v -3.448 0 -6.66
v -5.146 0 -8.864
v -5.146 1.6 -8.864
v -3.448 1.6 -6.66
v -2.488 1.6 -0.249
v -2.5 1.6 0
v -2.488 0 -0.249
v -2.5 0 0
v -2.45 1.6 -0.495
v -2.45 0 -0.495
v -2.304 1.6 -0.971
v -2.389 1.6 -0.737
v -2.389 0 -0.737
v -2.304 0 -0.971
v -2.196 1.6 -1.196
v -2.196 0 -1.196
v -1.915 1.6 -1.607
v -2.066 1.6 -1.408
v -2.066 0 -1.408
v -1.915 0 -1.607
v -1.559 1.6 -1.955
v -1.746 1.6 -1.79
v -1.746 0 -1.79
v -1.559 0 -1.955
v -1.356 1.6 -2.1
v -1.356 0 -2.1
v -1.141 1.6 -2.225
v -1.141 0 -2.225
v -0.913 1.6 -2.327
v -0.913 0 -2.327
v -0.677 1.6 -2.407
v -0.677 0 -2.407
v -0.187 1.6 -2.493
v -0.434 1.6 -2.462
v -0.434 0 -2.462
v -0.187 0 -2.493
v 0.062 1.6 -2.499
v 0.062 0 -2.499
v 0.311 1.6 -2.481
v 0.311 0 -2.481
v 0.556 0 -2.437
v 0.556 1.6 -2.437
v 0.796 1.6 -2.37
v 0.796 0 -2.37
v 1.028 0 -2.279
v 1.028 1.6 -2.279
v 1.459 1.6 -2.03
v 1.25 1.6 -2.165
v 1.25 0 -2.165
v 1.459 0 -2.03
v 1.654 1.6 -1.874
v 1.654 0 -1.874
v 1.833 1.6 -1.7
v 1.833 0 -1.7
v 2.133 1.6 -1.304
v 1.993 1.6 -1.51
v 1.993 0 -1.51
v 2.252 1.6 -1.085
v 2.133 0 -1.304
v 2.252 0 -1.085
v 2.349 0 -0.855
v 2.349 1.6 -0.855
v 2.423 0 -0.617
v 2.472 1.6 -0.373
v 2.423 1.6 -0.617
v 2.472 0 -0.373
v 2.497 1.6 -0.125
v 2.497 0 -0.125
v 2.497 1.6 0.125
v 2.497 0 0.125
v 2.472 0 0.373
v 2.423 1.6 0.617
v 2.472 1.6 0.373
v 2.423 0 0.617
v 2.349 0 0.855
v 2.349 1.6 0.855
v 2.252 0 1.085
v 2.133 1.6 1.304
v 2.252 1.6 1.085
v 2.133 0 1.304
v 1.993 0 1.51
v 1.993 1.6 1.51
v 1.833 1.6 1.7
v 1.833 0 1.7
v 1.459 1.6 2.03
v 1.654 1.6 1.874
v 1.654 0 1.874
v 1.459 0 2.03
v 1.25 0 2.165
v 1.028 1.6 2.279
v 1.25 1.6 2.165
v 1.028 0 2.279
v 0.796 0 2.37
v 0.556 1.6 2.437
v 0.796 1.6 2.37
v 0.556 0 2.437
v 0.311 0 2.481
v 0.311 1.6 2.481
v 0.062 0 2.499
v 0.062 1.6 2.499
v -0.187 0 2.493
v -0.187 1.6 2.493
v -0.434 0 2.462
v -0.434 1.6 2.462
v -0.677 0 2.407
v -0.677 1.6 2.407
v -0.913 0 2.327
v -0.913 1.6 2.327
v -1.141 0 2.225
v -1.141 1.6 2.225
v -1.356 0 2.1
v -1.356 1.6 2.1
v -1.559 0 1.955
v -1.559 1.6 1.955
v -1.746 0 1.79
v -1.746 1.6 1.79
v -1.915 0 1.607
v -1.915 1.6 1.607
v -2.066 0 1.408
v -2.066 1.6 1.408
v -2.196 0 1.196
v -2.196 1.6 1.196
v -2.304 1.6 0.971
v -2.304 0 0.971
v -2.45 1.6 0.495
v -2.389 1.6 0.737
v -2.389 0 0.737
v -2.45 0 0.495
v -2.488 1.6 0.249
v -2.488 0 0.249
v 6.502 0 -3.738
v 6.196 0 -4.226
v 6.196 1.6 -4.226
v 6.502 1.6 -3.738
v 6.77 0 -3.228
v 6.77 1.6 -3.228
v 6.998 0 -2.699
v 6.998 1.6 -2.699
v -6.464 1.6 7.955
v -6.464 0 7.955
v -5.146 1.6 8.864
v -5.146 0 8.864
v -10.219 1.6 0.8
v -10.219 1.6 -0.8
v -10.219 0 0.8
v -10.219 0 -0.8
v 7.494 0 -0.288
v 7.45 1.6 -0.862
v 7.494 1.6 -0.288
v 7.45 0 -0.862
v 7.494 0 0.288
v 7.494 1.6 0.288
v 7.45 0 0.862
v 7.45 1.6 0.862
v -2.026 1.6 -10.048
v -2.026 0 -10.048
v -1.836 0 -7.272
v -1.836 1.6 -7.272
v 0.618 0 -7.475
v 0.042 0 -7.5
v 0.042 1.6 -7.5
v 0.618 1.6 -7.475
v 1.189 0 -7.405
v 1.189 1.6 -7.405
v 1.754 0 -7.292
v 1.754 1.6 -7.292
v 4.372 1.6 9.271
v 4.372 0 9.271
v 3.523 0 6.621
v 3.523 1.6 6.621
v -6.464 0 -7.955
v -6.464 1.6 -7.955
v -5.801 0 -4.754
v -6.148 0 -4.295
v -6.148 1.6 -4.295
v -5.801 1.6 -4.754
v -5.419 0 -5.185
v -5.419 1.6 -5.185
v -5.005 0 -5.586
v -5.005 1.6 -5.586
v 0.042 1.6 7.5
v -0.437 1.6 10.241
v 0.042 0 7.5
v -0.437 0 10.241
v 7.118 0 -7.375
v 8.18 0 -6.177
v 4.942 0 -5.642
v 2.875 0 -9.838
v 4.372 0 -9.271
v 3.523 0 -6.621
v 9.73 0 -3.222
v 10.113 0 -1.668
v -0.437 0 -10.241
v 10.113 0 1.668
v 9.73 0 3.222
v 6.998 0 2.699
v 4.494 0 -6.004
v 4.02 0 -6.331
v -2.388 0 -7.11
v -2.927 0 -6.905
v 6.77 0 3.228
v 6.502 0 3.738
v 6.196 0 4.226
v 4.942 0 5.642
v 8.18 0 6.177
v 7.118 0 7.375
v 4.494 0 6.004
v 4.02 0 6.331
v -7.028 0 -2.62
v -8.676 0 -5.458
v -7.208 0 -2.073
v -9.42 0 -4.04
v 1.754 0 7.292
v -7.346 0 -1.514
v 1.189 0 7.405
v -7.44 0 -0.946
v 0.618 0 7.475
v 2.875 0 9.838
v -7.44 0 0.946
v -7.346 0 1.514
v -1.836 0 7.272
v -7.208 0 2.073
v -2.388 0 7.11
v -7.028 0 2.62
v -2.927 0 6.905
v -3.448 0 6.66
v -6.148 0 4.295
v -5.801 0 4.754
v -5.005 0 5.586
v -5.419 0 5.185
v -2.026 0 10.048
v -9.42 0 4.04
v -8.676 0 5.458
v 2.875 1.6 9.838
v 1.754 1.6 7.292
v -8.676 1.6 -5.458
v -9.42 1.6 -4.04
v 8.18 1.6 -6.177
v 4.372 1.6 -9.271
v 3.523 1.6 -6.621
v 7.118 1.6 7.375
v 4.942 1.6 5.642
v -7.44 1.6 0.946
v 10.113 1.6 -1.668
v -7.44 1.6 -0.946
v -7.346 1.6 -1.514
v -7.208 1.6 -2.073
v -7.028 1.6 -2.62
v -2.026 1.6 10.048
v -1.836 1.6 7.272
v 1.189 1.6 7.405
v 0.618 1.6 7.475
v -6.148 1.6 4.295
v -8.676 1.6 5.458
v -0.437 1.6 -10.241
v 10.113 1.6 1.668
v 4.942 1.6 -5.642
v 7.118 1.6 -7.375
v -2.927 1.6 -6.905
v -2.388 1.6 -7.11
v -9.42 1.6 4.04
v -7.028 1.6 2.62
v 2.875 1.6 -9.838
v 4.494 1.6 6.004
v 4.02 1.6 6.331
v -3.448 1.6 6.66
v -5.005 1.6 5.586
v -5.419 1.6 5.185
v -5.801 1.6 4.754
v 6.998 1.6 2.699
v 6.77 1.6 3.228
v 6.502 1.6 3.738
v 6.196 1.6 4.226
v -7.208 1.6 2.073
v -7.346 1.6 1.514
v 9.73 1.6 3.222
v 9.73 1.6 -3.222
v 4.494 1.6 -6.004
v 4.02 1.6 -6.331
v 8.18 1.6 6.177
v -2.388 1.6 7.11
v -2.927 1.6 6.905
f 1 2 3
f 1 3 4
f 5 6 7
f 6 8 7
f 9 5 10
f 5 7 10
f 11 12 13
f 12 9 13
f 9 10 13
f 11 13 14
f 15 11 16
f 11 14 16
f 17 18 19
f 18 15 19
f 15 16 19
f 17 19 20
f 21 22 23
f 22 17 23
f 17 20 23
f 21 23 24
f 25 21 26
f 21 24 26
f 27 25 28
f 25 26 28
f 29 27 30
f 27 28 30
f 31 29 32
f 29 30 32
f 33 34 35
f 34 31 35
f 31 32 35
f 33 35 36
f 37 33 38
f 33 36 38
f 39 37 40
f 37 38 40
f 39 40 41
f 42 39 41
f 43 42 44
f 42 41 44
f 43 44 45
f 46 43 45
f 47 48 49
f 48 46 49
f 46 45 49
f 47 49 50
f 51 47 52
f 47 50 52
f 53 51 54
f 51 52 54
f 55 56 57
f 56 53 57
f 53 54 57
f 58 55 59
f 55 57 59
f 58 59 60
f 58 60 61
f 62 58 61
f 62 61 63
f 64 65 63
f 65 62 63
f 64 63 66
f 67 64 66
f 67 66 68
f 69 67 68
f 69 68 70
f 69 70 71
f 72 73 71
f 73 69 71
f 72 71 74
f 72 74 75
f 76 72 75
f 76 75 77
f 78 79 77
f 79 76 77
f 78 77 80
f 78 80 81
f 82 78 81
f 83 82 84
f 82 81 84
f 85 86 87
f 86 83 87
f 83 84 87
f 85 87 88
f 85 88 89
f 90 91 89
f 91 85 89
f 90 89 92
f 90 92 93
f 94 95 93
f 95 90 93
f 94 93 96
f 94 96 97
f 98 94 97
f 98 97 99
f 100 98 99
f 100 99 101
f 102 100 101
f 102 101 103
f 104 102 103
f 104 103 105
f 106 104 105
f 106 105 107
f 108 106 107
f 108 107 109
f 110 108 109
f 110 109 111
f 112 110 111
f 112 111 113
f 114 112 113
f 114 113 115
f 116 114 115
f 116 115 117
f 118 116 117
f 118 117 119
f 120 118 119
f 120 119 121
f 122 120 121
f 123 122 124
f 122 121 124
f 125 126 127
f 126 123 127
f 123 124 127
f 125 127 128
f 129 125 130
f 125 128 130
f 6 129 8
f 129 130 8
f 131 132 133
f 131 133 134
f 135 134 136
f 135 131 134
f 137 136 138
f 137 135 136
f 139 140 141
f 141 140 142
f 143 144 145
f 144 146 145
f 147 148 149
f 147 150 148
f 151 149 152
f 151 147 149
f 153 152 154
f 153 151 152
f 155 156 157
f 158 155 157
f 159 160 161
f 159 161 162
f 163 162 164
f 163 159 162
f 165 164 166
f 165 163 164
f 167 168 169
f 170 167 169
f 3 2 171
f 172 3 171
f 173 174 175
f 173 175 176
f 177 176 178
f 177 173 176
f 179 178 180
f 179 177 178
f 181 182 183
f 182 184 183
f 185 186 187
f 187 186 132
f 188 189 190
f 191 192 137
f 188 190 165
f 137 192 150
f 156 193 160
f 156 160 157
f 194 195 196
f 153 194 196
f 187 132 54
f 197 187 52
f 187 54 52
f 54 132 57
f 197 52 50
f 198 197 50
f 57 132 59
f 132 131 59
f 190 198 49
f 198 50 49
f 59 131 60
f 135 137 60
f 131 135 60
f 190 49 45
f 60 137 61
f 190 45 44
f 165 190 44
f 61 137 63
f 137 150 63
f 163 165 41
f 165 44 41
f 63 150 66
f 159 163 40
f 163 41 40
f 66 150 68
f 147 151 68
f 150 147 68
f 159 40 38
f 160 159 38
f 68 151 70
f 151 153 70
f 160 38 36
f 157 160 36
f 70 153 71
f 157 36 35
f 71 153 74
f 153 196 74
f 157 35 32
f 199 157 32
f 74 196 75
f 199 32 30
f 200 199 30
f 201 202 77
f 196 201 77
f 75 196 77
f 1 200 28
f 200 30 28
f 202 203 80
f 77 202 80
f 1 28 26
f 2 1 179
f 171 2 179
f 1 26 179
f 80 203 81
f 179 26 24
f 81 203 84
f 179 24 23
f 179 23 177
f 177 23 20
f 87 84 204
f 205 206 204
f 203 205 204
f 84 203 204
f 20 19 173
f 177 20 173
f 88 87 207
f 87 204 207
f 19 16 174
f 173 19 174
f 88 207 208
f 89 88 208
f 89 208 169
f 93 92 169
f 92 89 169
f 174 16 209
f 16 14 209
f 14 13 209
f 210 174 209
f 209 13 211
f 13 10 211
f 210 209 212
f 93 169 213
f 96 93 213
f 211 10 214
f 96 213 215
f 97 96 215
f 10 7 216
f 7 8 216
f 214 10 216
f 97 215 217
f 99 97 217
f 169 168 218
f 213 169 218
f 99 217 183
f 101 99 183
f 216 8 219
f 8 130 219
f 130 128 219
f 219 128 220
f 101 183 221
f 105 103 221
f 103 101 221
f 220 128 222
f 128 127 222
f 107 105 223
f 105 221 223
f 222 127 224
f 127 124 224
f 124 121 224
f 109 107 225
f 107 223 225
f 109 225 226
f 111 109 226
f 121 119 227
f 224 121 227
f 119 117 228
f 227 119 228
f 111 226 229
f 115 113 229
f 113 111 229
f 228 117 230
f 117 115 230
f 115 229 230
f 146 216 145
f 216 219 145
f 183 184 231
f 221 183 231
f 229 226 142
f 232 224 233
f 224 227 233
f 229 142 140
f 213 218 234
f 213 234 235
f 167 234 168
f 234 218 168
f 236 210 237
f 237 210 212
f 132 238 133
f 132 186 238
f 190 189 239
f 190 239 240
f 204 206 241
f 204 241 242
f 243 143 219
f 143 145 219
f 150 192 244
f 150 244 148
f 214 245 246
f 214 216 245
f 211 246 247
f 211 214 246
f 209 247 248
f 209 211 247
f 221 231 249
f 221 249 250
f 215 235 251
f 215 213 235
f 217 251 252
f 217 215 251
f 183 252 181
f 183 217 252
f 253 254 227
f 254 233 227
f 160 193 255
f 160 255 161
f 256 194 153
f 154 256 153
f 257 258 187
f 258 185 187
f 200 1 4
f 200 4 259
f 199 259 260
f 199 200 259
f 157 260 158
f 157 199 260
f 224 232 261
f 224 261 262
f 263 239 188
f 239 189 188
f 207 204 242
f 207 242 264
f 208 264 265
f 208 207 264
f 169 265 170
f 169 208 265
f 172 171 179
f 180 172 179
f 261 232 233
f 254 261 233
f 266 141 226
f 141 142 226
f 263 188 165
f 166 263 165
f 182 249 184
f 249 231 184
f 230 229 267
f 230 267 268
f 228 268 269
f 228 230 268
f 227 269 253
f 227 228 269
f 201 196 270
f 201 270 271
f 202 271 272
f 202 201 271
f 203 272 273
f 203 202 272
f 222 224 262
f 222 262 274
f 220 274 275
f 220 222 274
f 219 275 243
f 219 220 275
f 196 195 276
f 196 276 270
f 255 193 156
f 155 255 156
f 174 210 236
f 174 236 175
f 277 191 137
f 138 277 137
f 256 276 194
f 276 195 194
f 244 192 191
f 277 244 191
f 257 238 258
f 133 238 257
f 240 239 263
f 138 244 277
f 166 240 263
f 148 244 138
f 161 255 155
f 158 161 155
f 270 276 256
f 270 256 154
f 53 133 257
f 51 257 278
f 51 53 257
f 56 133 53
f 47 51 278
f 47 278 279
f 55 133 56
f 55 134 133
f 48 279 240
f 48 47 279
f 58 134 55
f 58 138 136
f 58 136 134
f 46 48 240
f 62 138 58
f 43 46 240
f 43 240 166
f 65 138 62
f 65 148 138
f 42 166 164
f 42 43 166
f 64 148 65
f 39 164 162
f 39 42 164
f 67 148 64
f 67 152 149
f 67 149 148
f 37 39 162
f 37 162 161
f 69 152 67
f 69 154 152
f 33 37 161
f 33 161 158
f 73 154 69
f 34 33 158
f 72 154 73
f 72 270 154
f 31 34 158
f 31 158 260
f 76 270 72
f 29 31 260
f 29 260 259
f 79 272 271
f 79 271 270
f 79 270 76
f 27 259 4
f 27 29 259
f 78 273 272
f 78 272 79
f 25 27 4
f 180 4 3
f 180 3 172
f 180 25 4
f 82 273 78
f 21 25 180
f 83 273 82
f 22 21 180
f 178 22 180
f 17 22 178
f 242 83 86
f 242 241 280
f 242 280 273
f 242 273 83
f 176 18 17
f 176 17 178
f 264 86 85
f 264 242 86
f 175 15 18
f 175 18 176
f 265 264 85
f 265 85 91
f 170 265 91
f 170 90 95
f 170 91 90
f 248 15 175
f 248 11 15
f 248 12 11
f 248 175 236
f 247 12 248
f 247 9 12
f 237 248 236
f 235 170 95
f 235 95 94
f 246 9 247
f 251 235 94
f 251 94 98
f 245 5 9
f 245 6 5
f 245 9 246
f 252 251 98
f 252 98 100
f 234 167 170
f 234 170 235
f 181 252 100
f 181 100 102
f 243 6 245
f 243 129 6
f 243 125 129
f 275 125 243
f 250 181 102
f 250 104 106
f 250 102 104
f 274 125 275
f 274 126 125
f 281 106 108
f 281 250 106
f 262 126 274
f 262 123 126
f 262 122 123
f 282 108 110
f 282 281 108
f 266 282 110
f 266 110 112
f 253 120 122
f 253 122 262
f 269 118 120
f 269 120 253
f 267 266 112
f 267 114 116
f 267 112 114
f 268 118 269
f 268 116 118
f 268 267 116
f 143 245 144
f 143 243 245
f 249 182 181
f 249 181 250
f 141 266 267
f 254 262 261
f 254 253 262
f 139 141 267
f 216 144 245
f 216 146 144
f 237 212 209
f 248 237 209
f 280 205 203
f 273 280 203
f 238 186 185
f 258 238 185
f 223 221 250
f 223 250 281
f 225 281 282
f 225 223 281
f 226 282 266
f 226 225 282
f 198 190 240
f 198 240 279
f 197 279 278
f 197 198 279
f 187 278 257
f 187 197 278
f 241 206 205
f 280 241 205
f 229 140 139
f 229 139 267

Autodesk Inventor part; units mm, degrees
ref_plane "YZ Plane" through (0, 0, 0) normal (1, 0, 0) x (0, 1, 0)
ref_plane "XZ Plane" through (0, 0, 0) normal (0, 1, 0) x (-1, 0, 0)
ref_plane "XY Plane" through (0, 0, 0) normal (0, 0, 1) x (1, 0, 0)
sketch "Szkic2" plane through (0, 0, 0) normal (0, 1, 0) x (-1, 0, 0)
  circle A0 centre (0, 0) radius 2.5
  circle A1 centre (0, 0) radius 10.25
  line L0 (10.2187, -0.8002) -> (10.2187, 0.8002)
  line L1 (10.2187, -0.8002) -> (7.4401, -0.9459)
  line L2 (10.2187, -0.8002) -> (13.0011, -0.8002) construction
  line L3 (10.2187, 0.8002) -> (7.4401, 0.9459)
  line L4 (10.2187, 0.8002) -> (13.0011, 0.8002) construction
  line L5 (9.4201, 4.0403) -> (7.0275, 2.6201)
  line L6 (8.6763, 5.4575) -> (6.1483, 4.2951)
  line L7 (9.4201, 4.0403) -> (8.6763, 5.4575)
  line L8 (6.4635, 7.9552) -> (5.0049, 5.5858)
  line L9 (5.1463, 8.8644) -> (3.448, 6.6604)
  line L10 (6.4635, 7.9552) -> (5.1463, 8.8644)
  line L11 (2.0261, 10.0477) -> (1.8358, 7.2719)
  line L12 (0.4373, 10.2407) -> (-0.0422, 7.4999)
  line L13 (2.0261, 10.0477) -> (0.4373, 10.2407)
  line L14 (-2.8754, 9.8384) -> (-1.7539, 7.292)
  line L15 (-4.3718, 9.2709) -> (-3.5227, 6.6212)
  line L16 (-2.8754, 9.8384) -> (-4.3718, 9.2709)
  line L17 (-7.1182, 7.3753) -> (-4.9418, 5.6417)
  line L18 (-8.1795, 6.1773) -> (-6.1962, 4.2257)
  line L19 (-7.1182, 7.3753) -> (-8.1795, 6.1773)
  line L20 (-9.7303, 3.2225) -> (-6.9976, 2.6989)
  line L21 (-10.1133, 1.6685) -> (-7.4503, 0.8622)
  line L22 (-9.7303, 3.2225) -> (-10.1133, 1.6685)
  line L23 (-10.1133, -1.6685) -> (-7.4503, -0.8622)
  line L24 (-9.7303, -3.2225) -> (-6.9976, -2.6989)
  line L25 (-10.1133, -1.6685) -> (-9.7303, -3.2225)
  line L26 (-8.1795, -6.1773) -> (-6.1962, -4.2257)
  line L27 (-7.1182, -7.3753) -> (-4.9418, -5.6417)
  line L28 (-8.1795, -6.1773) -> (-7.1182, -7.3753)
  line L29 (-4.3718, -9.2709) -> (-3.5227, -6.6212)
  line L30 (-2.8754, -9.8384) -> (-1.7539, -7.292)
  line L31 (-4.3718, -9.2709) -> (-2.8754, -9.8384)
  line L32 (0.4373, -10.2407) -> (-0.0422, -7.4999)
  line L33 (2.0261, -10.0477) -> (1.8358, -7.2719)
  line L34 (0.4373, -10.2407) -> (2.0261, -10.0477)
  line L35 (5.1463, -8.8644) -> (3.448, -6.6604)
  line L36 (6.4635, -7.9552) -> (5.0049, -5.5858)
  line L37 (5.1463, -8.8644) -> (6.4635, -7.9552)
  line L38 (8.6763, -5.4575) -> (6.1483, -4.2951)
  line L39 (9.4201, -4.0403) -> (7.0275, -2.6201)
  line L40 (8.6763, -5.4575) -> (9.4201, -4.0403)
  arc A2 (7.0275, -2.6201) -> (7.4401, -0.9459) centre (0, 0) ccw
  arc A3 (5.0049, -5.5858) -> (6.1483, -4.2951) centre (0, 0) ccw
  arc A4 (7.4401, 0.9459) -> (7.0275, 2.6201) centre (0, 0) ccw
  arc A5 (6.1483, 4.2951) -> (5.0049, 5.5858) centre (0, 0) ccw
  arc A6 (3.448, 6.6604) -> (1.8358, 7.2719) centre (0, 0) ccw
  arc A7 (-0.0422, 7.4999) -> (-1.7539, 7.292) centre (0, 0) ccw
  arc A8 (-3.5227, 6.6212) -> (-4.9418, 5.6417) centre (0, 0) ccw
  arc A9 (-6.1962, 4.2257) -> (-6.9976, 2.6989) centre (0, 0) ccw
  arc A10 (-7.4503, 0.8622) -> (-7.4503, -0.8622) centre (0, 0) ccw
  arc A11 (-6.9976, -2.6989) -> (-6.1962, -4.2257) centre (0, 0) ccw
  arc A12 (-4.9418, -5.6417) -> (-3.5227, -6.6212) centre (0, 0) ccw
  arc A13 (-1.7539, -7.292) -> (-0.0422, -7.4999) centre (0, 0) ccw
  arc A14 (1.8358, -7.2719) -> (3.448, -6.6604) centre (0, 0) ccw
  dimension "d58" = 5
  dimension "d60" = 20.5
  dimension "d61" = 177
  dimension "d62" = 177
  dimension "d65" = 360
extrude "Wyciągnięcie proste6" add sketch "Szkic2" along normal blind 1.6 contours L0 L1 A2 L39 L40 L38 A3 L36 L37 L35 A14 L33 L34 L32 A13 L30 L31 L29 A12 L27 L28 L26 A11 L24 L25 L23 A10 L21 L22 L20 A9 L18 L19 L17 A8 L15 L16 L14 A7 L12 L13 L11 A6 L9 L10 L8 A5 L6 L7 L5 A4 L3
properties part number "efektor zebatka1"
